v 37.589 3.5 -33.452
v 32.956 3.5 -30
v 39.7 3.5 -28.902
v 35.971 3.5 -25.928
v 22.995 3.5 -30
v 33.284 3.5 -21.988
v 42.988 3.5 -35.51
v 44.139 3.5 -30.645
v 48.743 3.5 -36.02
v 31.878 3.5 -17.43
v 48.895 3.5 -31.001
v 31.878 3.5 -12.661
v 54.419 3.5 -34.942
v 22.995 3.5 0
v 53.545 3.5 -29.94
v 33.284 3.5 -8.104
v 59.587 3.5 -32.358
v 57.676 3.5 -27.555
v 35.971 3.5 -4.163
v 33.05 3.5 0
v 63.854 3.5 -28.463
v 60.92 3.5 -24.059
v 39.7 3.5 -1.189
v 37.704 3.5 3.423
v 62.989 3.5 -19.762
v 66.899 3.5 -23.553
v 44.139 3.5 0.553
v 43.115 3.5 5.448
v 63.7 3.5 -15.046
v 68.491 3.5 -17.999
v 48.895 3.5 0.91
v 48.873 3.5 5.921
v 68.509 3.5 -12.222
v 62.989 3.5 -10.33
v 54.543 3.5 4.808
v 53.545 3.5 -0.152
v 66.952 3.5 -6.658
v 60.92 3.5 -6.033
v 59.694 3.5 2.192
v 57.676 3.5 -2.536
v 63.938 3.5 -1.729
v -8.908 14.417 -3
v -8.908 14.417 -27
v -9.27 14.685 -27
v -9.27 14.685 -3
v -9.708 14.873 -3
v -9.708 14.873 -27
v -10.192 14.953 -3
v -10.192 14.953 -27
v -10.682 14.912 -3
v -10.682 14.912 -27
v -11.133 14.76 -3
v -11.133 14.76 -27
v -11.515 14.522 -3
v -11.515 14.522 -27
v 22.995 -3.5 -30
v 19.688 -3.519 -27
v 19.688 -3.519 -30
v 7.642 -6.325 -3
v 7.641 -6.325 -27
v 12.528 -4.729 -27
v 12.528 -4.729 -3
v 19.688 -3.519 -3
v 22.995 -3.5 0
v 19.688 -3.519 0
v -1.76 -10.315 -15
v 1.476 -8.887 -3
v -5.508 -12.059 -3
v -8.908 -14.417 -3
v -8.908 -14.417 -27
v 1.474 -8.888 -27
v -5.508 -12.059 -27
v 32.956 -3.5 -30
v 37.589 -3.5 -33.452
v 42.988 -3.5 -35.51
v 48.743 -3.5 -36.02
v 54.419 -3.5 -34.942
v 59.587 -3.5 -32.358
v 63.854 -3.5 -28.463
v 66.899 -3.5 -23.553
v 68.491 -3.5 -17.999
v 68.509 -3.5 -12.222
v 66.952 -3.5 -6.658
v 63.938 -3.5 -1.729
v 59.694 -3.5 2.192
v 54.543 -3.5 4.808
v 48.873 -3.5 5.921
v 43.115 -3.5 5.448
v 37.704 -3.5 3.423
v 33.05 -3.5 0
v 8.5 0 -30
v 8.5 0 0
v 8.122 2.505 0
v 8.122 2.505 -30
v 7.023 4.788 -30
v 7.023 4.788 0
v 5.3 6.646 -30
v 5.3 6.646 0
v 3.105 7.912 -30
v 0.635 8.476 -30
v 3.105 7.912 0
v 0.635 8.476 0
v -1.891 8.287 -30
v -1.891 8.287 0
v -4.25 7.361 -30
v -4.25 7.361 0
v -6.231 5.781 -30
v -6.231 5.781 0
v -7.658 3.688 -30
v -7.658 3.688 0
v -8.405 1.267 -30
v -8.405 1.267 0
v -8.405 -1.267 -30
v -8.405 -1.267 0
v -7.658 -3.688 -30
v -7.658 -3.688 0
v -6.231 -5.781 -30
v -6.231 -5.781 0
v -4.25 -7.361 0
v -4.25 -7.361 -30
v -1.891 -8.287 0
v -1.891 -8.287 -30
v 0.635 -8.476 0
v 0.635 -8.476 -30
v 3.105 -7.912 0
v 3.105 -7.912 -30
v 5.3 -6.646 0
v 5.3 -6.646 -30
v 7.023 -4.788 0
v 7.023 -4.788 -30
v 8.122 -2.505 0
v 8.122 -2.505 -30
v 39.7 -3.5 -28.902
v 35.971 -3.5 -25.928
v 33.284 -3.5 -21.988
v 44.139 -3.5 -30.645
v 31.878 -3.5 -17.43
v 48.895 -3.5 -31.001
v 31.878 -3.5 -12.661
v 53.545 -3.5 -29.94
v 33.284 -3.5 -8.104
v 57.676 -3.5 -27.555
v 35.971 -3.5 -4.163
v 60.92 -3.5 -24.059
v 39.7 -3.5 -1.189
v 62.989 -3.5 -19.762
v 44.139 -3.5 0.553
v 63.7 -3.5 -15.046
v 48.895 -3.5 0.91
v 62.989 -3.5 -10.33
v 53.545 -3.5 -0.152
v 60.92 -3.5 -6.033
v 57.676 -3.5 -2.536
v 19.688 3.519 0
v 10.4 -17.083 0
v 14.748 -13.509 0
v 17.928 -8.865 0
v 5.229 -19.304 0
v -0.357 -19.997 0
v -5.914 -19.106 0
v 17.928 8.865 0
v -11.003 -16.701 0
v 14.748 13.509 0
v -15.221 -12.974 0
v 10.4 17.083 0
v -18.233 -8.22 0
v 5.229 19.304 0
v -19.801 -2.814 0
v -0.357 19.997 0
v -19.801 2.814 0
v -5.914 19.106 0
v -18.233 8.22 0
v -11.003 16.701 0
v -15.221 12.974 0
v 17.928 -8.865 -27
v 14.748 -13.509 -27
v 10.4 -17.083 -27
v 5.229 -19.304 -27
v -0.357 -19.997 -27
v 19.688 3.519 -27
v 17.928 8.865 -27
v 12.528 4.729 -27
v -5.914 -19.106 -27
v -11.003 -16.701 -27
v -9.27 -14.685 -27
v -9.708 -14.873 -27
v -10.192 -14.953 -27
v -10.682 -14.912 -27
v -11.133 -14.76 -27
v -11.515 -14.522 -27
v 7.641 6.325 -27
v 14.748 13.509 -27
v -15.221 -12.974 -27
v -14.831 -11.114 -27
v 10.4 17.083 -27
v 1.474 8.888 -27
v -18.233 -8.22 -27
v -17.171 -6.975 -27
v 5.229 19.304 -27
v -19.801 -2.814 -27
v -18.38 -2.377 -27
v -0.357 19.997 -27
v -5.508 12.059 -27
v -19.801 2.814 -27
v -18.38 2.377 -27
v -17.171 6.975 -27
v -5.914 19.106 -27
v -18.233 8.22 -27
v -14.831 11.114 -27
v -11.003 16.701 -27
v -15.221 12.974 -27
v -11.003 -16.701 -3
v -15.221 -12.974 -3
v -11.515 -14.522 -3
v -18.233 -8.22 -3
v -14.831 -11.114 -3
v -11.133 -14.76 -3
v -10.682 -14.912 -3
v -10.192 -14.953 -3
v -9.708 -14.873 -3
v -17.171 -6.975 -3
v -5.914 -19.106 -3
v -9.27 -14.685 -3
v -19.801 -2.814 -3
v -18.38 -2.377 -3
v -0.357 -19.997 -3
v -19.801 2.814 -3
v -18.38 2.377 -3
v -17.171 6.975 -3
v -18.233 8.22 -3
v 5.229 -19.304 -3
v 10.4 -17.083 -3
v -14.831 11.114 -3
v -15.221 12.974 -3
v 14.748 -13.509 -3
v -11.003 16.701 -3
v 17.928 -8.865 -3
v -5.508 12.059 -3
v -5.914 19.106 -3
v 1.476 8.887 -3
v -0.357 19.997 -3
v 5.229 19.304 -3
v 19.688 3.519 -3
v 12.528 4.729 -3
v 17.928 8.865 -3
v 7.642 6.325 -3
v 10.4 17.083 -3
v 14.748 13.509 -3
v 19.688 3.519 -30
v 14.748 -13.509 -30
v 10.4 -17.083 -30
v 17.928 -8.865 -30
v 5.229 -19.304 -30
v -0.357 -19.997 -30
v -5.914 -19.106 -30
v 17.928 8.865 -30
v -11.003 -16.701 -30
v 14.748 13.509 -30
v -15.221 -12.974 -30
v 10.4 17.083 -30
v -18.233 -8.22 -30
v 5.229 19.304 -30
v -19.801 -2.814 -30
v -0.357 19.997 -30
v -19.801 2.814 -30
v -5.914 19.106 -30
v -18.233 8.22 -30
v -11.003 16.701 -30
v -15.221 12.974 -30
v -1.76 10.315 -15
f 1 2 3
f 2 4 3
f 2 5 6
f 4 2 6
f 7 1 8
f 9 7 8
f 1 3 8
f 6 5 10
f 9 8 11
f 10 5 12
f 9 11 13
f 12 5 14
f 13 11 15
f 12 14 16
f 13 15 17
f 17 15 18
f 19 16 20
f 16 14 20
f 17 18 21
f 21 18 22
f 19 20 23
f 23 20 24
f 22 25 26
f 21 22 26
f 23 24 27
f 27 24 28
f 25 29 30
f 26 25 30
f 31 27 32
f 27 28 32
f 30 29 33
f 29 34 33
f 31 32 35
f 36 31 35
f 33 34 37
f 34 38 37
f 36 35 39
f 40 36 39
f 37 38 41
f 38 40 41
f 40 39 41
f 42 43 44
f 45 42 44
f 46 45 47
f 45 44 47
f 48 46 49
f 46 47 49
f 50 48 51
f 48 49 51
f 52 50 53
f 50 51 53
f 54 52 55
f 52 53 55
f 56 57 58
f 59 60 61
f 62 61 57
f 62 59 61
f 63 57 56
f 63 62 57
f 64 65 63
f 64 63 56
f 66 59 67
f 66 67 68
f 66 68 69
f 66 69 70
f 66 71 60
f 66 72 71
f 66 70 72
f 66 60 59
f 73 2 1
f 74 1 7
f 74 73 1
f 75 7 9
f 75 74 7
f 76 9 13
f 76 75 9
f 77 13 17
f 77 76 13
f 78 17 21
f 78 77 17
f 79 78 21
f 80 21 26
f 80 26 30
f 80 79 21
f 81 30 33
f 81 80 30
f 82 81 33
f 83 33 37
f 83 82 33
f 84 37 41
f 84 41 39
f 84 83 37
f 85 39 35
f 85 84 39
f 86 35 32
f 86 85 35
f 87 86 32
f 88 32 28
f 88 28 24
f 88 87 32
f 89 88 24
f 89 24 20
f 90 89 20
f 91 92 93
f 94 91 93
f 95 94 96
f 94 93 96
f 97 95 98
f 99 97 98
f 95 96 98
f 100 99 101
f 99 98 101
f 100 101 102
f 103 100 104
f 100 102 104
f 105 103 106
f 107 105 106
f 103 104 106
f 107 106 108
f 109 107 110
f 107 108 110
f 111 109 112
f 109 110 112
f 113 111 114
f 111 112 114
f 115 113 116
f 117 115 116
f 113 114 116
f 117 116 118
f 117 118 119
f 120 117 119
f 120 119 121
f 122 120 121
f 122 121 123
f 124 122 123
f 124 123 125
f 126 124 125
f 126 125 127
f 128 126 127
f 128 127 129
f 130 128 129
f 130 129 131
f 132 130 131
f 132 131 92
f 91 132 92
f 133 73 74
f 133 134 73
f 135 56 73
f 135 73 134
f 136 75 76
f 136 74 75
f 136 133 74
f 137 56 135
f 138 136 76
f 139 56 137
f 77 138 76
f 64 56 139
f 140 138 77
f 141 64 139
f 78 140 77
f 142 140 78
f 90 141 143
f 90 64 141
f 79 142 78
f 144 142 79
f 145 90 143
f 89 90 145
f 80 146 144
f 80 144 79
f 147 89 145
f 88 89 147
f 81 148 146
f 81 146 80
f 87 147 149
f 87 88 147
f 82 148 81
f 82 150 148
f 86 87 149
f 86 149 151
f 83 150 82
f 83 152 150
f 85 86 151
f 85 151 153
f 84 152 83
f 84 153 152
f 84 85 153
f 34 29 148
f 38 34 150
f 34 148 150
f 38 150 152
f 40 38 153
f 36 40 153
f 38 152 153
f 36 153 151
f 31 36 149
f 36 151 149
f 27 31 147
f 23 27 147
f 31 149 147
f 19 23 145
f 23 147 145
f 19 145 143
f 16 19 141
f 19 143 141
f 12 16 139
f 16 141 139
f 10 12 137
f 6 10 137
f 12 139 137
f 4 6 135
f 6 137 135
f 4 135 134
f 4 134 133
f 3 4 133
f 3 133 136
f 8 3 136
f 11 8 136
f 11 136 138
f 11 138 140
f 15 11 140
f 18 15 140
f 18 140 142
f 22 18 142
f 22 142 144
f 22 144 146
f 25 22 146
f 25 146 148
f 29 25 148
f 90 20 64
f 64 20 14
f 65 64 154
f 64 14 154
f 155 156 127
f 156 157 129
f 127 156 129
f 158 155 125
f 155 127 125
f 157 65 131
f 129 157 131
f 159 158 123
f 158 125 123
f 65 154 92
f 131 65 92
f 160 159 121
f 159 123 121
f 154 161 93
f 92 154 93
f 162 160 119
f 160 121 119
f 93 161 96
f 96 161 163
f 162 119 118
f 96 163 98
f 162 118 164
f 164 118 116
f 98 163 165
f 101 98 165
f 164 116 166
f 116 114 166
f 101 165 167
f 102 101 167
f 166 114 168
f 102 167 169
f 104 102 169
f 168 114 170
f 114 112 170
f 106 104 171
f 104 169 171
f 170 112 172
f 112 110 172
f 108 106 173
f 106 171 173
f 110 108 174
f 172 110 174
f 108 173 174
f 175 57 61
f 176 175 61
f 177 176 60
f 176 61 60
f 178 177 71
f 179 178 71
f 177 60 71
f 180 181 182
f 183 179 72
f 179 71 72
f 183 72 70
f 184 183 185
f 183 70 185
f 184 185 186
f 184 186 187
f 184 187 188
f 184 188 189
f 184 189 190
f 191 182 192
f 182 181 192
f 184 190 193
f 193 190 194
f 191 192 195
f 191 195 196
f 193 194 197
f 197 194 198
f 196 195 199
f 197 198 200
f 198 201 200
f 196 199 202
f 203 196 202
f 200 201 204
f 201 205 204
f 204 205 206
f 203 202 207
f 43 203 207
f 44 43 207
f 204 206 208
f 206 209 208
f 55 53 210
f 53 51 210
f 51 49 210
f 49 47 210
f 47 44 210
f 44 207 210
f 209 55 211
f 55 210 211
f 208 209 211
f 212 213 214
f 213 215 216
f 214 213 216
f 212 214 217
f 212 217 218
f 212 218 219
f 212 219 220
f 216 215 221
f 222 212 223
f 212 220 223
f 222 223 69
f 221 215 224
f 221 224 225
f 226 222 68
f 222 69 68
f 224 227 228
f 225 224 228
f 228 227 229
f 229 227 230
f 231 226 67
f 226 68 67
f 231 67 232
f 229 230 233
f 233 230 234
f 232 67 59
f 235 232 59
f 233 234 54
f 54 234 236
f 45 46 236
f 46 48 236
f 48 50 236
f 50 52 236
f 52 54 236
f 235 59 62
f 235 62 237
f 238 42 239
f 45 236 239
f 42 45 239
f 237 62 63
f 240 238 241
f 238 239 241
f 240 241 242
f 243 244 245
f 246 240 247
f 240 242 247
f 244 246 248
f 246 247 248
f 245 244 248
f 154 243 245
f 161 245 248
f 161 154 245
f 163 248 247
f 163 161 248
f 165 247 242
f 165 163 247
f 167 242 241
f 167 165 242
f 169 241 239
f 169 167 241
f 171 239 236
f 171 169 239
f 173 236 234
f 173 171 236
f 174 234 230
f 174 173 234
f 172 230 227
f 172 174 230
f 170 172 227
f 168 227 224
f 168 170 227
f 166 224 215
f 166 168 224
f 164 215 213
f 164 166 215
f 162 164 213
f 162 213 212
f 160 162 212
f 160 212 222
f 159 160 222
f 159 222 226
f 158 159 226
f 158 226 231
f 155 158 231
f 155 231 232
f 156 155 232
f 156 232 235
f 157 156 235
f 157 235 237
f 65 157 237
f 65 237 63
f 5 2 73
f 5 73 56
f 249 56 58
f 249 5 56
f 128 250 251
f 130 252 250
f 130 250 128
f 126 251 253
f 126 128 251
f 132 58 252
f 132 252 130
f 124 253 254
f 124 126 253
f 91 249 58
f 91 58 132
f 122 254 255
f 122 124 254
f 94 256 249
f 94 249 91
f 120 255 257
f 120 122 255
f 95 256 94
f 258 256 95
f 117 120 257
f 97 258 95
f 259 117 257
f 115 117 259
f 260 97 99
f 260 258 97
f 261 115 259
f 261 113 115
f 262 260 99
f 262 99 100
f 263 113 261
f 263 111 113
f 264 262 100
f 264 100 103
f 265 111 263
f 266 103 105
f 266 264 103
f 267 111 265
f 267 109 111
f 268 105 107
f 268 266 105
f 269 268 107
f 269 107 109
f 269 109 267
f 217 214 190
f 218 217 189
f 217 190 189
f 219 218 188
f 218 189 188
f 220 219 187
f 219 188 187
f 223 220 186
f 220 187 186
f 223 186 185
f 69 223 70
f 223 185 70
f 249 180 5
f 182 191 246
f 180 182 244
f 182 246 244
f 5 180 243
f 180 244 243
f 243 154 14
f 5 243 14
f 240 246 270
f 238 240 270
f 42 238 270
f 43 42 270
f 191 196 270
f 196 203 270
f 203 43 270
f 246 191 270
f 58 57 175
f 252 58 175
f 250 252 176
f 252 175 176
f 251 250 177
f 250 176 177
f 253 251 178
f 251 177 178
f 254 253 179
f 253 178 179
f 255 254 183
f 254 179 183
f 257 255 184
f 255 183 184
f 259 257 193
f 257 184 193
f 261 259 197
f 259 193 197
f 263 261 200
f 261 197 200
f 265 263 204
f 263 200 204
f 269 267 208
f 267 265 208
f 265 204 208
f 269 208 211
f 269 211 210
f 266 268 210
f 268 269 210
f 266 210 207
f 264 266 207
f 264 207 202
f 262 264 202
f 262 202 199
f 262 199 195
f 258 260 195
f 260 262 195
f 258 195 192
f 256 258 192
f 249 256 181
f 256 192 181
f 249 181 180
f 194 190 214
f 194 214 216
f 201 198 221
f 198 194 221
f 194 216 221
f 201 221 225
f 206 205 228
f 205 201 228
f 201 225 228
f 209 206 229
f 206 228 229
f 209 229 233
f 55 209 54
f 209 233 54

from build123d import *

# Parameters (mm, degrees)
SKETCH1_R           = 20
BOSS_EXTRUDE1_DEPTH = 3
BOSS_EXTRUDE2_DEPTH = 30
FILLET1_R           = 2
SKETCH3_R           = 21
BOSS_EXTRUDE3_DEPTH = 7
BOSS_EXTRUDE4_START = -3
SKETCH4_R           = 20
BOSS_EXTRUDE4_DEPTH = 3
SKETCH5_R           = 8.5
CUT_EXTRUDE1_DEPTH  = 43
SKETCH6_R           = 16
CUT_EXTRUDE2_DEPTH  = 43


with BuildPart() as part:
    # Sketch1 → Boss-Extrude1 (new body)
    with BuildSketch(Plane.XY):
        Circle(SKETCH1_R)
    extrude(amount=-BOSS_EXTRUDE1_DEPTH)

    # Sketch2 → Boss-Extrude2 (add)
    with BuildSketch(Plane.XY):
        with BuildLine():
            Line((22.995189637, 3.5), (35.372983102, 3.5))
            Line((35.372983102, 3.5), (35.372983102, -3.5))
            Line((35.372983102, -3.5), (22.995189637, -3.5))
            add(Edge.make_bspline(
                [(-10.012259603, -15.596019766), (-7.820118135, -12.904569359), (3.188583593, -8.31405085), (13.833155486, -3.052585892), (22.995189637, -3.5)],
                knots=[0, 0, 0, 0, 0.276488418, 1, 1, 1, 1], degree=3))
            ThreePointArc((-10.012259603, -15.596019766), (-18.533245126, 0), (-10.012259603, 15.596019766))
            add(Edge.make_bspline(
                [(-10.012259603, 15.596019766), (-7.820118135, 12.904569359), (3.188583593, 8.31405085), (13.833155486, 3.052585892), (22.995189637, 3.5)],
                knots=[0, 0, 0, 0, 0.276488418, 1, 1, 1, 1], degree=3))
        make_face()
    extrude(amount=-BOSS_EXTRUDE2_DEPTH)

    # Fillet1
    fillet1_edges = [part.edges().sort_by_distance(p)[0] for p in [
        (-10.012259603, 15.596019766, -16.5),
        (-10.012259603, -15.596019766, -16.5),
    ]]
    fillet(fillet1_edges, radius=FILLET1_R)

    # Sketch3 → Boss-Extrude3 (add)
    with BuildSketch(Plane.XZ.offset(3.5)):
        with Locations((47.699784797, -15.04571332)):
            Circle(SKETCH3_R)
    extrude(amount=-BOSS_EXTRUDE3_DEPTH)

    # Sketch4 → Boss-Extrude4 (add)
    with BuildSketch(Plane(origin=(0, 0, -30), x_dir=(-1, 0, 0), z_dir=(0, 0, -1)).offset(BOSS_EXTRUDE4_START)):
        Circle(SKETCH4_R)
    extrude(amount=BOSS_EXTRUDE4_DEPTH)

    # Sketch5 → Cut-Extrude1 (cut)
    with BuildSketch(Plane.XY):
        Circle(SKETCH5_R)
    extrude(amount=-CUT_EXTRUDE1_DEPTH, mode=Mode.SUBTRACT)

    # Sketch6 → Cut-Extrude2 (cut)
    with BuildSketch(Plane.XZ.offset(3.5)):
        with Locations((47.699784797, -15.04571332)):
            Circle(SKETCH6_R)
    extrude(amount=-CUT_EXTRUDE2_DEPTH, mode=Mode.SUBTRACT)


solid = part.part
